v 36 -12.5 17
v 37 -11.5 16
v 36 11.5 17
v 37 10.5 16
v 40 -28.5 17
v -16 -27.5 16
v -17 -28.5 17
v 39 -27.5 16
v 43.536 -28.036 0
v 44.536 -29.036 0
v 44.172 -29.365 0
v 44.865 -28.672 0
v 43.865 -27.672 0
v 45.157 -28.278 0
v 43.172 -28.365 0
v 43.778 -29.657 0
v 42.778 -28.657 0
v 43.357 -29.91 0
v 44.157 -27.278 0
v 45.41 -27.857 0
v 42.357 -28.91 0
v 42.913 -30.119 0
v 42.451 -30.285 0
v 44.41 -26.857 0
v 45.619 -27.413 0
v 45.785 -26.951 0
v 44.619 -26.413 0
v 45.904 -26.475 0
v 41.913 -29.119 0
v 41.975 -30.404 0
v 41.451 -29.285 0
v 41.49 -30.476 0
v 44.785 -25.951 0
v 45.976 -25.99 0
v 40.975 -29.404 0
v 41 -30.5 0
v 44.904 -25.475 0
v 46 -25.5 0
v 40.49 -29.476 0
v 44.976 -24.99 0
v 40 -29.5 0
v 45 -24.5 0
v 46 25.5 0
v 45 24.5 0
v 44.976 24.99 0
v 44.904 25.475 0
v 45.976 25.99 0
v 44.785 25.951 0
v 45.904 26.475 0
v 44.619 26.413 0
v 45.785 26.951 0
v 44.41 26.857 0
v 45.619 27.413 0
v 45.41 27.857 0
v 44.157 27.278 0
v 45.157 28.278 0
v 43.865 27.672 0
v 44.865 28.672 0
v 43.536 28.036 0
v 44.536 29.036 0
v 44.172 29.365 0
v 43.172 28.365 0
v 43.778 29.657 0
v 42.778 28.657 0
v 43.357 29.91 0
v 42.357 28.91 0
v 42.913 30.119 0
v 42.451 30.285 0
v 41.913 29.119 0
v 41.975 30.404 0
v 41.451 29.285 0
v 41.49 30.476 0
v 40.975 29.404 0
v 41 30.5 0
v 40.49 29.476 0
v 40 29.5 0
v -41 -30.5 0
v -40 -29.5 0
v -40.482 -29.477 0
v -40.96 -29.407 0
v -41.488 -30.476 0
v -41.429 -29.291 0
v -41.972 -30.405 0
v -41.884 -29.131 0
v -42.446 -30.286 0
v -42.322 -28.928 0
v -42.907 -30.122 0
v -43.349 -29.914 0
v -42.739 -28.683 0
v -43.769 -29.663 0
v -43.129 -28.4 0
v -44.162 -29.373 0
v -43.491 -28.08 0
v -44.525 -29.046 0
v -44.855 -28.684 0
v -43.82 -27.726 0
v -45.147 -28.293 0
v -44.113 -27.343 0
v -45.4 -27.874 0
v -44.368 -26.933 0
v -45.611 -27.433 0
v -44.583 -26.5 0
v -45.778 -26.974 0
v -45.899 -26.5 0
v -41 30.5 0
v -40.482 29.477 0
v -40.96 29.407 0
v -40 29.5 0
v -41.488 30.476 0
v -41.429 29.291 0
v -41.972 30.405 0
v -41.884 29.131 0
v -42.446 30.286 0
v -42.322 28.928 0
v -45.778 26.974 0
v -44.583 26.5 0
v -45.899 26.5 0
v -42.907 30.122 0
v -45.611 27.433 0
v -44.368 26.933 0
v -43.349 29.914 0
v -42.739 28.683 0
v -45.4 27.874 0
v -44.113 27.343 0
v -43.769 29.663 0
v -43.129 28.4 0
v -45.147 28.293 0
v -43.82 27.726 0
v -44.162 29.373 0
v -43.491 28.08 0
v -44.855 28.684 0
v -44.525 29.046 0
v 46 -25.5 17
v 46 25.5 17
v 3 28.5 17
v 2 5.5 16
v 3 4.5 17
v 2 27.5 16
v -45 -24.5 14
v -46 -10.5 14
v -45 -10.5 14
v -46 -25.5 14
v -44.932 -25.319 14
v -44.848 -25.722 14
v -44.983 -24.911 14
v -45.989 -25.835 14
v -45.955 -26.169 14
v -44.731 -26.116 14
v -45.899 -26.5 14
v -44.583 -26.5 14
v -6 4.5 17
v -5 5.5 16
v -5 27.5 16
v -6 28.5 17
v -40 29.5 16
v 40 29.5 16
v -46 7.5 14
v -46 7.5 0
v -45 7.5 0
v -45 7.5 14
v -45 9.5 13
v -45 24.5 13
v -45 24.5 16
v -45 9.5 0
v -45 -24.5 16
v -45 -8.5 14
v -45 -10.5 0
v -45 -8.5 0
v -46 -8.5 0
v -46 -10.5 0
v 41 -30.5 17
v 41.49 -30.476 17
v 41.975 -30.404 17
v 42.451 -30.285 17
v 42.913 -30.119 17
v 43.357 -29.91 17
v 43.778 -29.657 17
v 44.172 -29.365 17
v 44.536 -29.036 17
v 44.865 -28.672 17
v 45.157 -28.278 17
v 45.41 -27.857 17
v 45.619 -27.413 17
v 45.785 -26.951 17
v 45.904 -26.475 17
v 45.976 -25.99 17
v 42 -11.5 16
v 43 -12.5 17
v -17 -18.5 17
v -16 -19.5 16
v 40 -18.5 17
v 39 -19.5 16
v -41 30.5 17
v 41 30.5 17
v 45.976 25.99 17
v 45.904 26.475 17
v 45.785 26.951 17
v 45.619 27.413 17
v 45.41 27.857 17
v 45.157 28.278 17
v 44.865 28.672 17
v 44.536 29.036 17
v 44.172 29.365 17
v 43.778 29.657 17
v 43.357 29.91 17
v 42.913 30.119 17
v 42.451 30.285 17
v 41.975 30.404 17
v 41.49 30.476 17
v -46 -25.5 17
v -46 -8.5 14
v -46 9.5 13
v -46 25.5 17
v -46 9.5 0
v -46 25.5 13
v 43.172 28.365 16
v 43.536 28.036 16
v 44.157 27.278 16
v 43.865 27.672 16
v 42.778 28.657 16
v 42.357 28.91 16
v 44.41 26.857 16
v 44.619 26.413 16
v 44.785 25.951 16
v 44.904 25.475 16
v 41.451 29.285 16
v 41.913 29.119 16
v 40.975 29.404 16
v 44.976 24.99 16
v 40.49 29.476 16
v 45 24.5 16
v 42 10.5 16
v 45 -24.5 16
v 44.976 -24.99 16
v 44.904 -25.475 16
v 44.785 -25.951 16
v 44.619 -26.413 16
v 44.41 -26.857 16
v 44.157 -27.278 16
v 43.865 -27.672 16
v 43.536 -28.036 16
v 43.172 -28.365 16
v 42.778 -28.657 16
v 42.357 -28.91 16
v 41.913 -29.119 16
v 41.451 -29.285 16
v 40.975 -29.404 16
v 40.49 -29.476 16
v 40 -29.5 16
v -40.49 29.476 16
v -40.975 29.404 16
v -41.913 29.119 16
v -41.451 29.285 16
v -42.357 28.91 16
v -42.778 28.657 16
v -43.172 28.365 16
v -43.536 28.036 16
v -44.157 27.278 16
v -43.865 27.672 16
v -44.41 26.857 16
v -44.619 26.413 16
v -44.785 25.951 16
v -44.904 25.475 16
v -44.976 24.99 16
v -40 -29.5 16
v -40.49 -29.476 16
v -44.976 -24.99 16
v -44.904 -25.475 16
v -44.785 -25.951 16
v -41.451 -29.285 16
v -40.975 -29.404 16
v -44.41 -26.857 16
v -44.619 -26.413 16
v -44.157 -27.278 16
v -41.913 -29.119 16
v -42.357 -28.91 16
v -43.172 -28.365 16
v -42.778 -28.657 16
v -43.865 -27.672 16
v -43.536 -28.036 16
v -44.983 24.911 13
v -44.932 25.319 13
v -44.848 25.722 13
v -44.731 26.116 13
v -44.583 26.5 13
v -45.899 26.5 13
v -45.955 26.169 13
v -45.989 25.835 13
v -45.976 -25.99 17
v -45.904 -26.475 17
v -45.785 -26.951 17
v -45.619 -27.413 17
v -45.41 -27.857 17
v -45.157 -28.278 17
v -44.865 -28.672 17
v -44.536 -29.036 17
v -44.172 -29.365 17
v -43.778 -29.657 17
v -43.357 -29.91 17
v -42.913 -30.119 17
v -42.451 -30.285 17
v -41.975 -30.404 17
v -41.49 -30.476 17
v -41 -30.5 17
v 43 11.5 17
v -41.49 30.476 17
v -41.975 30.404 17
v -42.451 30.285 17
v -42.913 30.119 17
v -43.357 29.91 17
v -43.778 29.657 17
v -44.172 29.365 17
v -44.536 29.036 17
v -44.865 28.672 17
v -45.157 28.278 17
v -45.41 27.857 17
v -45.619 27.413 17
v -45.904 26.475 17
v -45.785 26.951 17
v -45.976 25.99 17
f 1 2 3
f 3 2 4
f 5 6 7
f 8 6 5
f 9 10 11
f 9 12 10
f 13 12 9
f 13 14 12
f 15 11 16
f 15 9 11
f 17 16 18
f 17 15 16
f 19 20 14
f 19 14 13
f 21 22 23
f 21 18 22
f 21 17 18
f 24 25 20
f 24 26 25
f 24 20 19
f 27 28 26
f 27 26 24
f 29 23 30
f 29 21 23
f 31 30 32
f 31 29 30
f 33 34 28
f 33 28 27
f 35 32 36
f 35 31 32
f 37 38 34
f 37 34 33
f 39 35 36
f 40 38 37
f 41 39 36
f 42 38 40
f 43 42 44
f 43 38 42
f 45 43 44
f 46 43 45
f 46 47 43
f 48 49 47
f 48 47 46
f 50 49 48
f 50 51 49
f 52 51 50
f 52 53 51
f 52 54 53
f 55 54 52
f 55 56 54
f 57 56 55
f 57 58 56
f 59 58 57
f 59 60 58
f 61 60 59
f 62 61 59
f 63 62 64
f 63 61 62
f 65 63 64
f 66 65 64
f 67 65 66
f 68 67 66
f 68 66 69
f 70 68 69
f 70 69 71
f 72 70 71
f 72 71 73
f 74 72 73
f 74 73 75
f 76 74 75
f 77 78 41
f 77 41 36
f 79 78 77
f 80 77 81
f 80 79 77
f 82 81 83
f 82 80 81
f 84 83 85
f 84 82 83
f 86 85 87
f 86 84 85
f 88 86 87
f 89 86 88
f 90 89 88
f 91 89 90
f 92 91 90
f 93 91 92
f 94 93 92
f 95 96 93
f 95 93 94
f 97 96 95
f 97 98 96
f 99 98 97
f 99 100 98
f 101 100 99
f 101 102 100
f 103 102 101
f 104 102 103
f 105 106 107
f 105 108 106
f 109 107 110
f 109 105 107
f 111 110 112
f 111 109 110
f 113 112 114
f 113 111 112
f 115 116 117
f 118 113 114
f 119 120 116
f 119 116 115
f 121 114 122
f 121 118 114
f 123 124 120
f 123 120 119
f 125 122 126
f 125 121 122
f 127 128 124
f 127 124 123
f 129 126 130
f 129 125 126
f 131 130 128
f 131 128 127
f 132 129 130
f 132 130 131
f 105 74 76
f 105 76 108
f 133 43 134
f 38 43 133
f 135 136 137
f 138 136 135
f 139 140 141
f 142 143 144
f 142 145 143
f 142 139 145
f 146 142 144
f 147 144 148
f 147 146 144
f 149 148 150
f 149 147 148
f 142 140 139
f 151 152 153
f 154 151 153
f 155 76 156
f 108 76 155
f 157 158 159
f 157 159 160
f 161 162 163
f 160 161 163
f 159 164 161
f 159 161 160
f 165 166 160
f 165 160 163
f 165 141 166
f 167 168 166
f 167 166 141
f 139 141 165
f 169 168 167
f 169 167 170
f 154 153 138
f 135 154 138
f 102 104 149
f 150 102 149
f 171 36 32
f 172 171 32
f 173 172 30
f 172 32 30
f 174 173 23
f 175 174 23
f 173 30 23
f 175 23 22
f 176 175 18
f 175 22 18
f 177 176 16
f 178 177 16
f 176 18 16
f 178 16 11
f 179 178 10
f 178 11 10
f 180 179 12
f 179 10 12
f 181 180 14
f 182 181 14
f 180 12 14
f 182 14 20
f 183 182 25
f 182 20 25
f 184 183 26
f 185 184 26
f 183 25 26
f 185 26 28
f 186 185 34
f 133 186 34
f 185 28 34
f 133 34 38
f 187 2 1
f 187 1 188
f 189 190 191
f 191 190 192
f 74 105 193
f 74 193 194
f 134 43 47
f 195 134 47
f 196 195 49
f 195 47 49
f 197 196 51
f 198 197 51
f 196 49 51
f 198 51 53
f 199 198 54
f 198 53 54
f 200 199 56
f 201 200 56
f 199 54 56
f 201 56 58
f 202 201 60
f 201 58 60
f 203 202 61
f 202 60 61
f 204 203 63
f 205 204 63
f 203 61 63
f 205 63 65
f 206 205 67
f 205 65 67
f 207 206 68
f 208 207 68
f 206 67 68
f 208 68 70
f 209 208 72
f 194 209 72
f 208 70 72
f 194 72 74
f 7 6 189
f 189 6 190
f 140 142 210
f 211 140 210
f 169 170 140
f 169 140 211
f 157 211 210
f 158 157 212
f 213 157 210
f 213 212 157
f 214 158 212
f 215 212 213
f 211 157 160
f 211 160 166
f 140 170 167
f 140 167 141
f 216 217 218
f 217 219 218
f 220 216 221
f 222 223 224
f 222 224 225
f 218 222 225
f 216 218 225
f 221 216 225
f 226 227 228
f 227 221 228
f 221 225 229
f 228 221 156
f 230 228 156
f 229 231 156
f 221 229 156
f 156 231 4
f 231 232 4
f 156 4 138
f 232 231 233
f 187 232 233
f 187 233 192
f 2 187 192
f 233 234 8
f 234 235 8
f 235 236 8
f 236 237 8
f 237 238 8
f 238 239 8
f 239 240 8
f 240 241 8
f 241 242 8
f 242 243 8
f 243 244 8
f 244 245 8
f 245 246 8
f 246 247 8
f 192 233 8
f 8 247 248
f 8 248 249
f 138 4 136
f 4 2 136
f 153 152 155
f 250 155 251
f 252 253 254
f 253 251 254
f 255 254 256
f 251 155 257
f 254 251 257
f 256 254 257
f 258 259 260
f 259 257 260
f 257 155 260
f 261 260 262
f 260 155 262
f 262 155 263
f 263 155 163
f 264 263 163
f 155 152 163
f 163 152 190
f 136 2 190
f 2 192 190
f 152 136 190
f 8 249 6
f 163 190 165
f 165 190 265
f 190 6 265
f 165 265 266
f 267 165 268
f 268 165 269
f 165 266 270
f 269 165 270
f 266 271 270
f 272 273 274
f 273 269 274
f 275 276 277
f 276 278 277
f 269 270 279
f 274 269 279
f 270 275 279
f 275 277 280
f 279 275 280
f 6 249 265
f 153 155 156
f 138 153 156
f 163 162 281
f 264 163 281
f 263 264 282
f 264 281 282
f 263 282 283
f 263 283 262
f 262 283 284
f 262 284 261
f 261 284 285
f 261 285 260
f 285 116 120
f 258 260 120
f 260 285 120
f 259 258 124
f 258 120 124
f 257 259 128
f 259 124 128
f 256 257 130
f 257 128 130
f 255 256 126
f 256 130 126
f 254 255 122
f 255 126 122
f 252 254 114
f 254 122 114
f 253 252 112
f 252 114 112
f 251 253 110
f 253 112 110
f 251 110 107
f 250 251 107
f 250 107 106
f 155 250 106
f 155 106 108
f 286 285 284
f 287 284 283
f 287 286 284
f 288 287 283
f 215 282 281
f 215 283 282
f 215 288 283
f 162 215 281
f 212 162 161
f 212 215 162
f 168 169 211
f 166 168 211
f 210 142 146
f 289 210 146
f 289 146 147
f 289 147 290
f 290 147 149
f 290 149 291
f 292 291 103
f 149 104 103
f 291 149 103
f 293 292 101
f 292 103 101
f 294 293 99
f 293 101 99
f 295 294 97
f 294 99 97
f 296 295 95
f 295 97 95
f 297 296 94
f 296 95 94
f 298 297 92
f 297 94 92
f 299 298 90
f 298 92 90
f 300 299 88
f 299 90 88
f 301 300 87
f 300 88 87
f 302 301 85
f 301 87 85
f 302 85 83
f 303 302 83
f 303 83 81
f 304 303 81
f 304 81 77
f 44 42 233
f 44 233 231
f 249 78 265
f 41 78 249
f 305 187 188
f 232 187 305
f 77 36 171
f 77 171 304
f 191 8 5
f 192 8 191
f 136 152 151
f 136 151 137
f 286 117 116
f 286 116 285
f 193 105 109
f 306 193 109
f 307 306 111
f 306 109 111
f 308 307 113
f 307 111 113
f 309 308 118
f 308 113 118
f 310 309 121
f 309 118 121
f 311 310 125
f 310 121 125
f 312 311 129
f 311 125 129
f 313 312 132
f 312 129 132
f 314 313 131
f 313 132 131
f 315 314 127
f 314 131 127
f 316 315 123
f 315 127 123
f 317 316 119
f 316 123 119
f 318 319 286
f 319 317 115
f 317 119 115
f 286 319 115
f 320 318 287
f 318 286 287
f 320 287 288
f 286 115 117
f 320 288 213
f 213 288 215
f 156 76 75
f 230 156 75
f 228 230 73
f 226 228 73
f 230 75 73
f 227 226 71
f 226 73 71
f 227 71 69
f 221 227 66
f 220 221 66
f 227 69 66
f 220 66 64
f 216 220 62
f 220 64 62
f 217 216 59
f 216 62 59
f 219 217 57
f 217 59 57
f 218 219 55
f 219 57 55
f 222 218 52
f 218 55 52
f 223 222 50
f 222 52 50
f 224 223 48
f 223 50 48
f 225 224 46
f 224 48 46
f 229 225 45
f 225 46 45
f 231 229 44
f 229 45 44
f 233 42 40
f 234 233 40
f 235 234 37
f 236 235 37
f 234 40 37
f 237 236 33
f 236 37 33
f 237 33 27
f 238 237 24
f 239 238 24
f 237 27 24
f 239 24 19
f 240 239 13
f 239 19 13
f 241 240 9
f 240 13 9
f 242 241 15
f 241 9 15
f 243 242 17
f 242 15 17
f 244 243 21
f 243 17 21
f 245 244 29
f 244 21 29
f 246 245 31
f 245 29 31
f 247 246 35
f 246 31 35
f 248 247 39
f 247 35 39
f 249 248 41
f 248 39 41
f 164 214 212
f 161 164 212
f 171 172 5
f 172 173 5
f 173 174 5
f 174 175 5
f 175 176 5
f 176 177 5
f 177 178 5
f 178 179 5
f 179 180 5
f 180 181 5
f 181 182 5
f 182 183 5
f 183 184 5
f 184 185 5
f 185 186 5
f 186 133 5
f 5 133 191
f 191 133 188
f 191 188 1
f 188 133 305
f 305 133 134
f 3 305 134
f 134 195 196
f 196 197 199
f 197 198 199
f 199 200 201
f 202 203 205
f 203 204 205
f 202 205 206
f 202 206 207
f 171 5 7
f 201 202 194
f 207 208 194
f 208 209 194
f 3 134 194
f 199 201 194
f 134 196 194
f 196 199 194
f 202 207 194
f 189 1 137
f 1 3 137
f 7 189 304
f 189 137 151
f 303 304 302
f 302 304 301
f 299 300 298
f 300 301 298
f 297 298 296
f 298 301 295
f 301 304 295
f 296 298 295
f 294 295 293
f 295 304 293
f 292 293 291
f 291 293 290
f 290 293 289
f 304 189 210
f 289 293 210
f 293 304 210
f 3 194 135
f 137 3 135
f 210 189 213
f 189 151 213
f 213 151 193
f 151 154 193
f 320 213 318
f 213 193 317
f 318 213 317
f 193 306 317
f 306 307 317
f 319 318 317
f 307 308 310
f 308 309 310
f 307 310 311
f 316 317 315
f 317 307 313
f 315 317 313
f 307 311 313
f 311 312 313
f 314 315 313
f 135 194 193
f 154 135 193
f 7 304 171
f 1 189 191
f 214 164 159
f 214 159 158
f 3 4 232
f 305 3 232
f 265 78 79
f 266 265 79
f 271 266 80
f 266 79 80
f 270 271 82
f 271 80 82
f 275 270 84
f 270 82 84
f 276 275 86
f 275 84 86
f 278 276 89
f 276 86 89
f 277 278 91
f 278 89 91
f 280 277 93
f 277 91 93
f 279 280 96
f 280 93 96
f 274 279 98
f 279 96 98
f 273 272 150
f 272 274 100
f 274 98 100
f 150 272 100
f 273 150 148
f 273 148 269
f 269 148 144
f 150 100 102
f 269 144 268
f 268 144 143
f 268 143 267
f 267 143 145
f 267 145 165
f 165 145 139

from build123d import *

# Parameters (mm, degrees)
PAD_DEPTH       = 17
SKETCH001_W     = 55
SKETCH001_H     = 8
POCKET_DEPTH    = 17.001
CHAMFER_SIZE    = 1
SKETCH002_W     = 7
SKETCH002_H     = 22
POCKET001_DEPTH = 17.001
CHAMFER001_SIZE = 1
SKETCH003_W     = 5
SKETCH003_H     = 22
POCKET002_DEPTH = 17.001
CHAMFER002_SIZE = 1
POCKET003_DEPTH = 7
POCKET004_DEPTH = 16
SKETCH005_W     = 17
SKETCH005_H     = 13
SKETCH005_W_2   = 16
SKETCH005_H_2   = 14
POCKET005_DEPTH = 5


with BuildPart() as part:
    # Sketch → Pad (new body)
    with BuildSketch(Plane.XY):
        with BuildLine():
            Line((-41, 30.5), (41, 30.5))
            ThreePointArc((46, 25.5), (44.535534, 29.035534), (41, 30.5))
            Line((46, 25.5), (46, -25.5))
            ThreePointArc((41, -30.5), (44.535534, -29.035534), (46, -25.5))
            Line((41, -30.5), (-41, -30.5))
            ThreePointArc((-46, -25.5), (-44.535534, -29.035534), (-41, -30.5))
            Line((-46, -25.5), (-46, 25.5))
            ThreePointArc((-41, 30.5), (-44.535534, 29.035534), (-46, 25.5))
        make_face()
    extrude(amount=PAD_DEPTH)

    # Sketch001 (on Face10 of Pad) → Pocket (cut, through all)
    with BuildSketch(Plane.XY.offset(17)):
        with Locations((11.5, -23.5)):
            Rectangle(SKETCH001_W, SKETCH001_H)
    extrude(amount=-POCKET_DEPTH, mode=Mode.SUBTRACT)

    # Chamfer
    chamfer_edges = [part.edges().sort_by_distance(p)[0] for p in [
        (11.5, -27.5, 17),
        (-16, -23.5, 17),
        (11.5, -19.5, 17),
        (39, -23.5, 17),
    ]]
    chamfer(chamfer_edges, length=CHAMFER_SIZE)

    # Sketch002 (on Face1 of Chamfer) → Pocket001 (cut, through all)
    with BuildSketch(Plane.XY.offset(17)):
        with Locations((-1.5, 16.5)):
            Rectangle(SKETCH002_W, SKETCH002_H)
    extrude(amount=-POCKET001_DEPTH, mode=Mode.SUBTRACT)

    # Chamfer001
    chamfer001_edges = [part.edges().sort_by_distance(p)[0] for p in [
        (-5, 16.5, 17),
        (-1.5, 27.5, 17),
        (2, 16.5, 17),
        (-1.5, 5.5, 17),
    ]]
    chamfer(chamfer001_edges, length=CHAMFER001_SIZE)

    # Sketch003 (on Face1 of Chamfer001) → Pocket002 (cut, through all)
    with BuildSketch(Plane.XY.offset(17)):
        with Locations((39.5, -0.5)):
            Rectangle(SKETCH003_W, SKETCH003_H)
    extrude(amount=-POCKET002_DEPTH, mode=Mode.SUBTRACT)

    # Chamfer002
    chamfer002_edges = [part.edges().sort_by_distance(p)[0] for p in [
        (39.5, -11.5, 17),
        (42, -0.5, 17),
        (37, -0.5, 17),
        (39.5, 10.5, 17),
    ]]
    chamfer(chamfer002_edges, length=CHAMFER002_SIZE)

    # Sketch004 (on Face26 of Chamfer002) → Pocket003 (cut)
    with BuildSketch(Plane(origin=(0, 0, 0), x_dir=(1, 0, 0), z_dir=(0, 0, -1))):
        with BuildLine():
            Line((-40, 29.5), (40, 29.5))
            ThreePointArc((45, 24.5), (43.535534, 28.035534), (40, 29.5))
            Line((45, 24.5), (45, -24.5))
            ThreePointArc((40, -29.5), (43.535534, -28.035534), (45, -24.5))
            Line((40, -29.5), (-40, -29.5))
            ThreePointArc((-45, -24.5), (-43.535534, -28.035534), (-40, -29.5))
            Line((-45, -24.5), (-45, 24.5))
            ThreePointArc((-40, 29.5), (-43.535534, 28.035534), (-45, 24.5))
        make_face()
    extrude(amount=-POCKET003_DEPTH, mode=Mode.SUBTRACT)

    # Sketch004 (on Face26 of Chamfer002) → Pocket004 (cut)
    with BuildSketch(Plane(origin=(0, 0, 0), x_dir=(1, 0, 0), z_dir=(0, 0, -1))):
        with BuildLine():
            Line((-40, 29.5), (40, 29.5))
            ThreePointArc((45, 24.5), (43.535534, 28.035534), (40, 29.5))
            Line((45, 24.5), (45, -24.5))
            ThreePointArc((40, -29.5), (43.535534, -28.035534), (45, -24.5))
            Line((40, -29.5), (-40, -29.5))
            ThreePointArc((-45, -24.5), (-43.535534, -28.035534), (-40, -29.5))
            Line((-45, -24.5), (-45, 24.5))
            ThreePointArc((-40, 29.5), (-43.535534, 28.035534), (-45, 24.5))
        make_face()
    extrude(amount=-POCKET004_DEPTH, mode=Mode.SUBTRACT)

    # Sketch005 (on Face6 of Pocket004) → Pocket005 (cut)
    with BuildSketch(Plane(origin=(-46, 0, 0), x_dir=(0, -1, 0), z_dir=(-1, 0, 0))):
        with Locations((-18, 6.5)):
            Rectangle(SKETCH005_W, SKETCH005_H)
        with Locations((0.5, 7)):
            Rectangle(SKETCH005_W_2, SKETCH005_H_2)
        with Locations((18.5, 7)):
            Rectangle(SKETCH005_W_2, SKETCH005_H_2)
    extrude(amount=-POCKET005_DEPTH, mode=Mode.SUBTRACT)


solid = part.part
